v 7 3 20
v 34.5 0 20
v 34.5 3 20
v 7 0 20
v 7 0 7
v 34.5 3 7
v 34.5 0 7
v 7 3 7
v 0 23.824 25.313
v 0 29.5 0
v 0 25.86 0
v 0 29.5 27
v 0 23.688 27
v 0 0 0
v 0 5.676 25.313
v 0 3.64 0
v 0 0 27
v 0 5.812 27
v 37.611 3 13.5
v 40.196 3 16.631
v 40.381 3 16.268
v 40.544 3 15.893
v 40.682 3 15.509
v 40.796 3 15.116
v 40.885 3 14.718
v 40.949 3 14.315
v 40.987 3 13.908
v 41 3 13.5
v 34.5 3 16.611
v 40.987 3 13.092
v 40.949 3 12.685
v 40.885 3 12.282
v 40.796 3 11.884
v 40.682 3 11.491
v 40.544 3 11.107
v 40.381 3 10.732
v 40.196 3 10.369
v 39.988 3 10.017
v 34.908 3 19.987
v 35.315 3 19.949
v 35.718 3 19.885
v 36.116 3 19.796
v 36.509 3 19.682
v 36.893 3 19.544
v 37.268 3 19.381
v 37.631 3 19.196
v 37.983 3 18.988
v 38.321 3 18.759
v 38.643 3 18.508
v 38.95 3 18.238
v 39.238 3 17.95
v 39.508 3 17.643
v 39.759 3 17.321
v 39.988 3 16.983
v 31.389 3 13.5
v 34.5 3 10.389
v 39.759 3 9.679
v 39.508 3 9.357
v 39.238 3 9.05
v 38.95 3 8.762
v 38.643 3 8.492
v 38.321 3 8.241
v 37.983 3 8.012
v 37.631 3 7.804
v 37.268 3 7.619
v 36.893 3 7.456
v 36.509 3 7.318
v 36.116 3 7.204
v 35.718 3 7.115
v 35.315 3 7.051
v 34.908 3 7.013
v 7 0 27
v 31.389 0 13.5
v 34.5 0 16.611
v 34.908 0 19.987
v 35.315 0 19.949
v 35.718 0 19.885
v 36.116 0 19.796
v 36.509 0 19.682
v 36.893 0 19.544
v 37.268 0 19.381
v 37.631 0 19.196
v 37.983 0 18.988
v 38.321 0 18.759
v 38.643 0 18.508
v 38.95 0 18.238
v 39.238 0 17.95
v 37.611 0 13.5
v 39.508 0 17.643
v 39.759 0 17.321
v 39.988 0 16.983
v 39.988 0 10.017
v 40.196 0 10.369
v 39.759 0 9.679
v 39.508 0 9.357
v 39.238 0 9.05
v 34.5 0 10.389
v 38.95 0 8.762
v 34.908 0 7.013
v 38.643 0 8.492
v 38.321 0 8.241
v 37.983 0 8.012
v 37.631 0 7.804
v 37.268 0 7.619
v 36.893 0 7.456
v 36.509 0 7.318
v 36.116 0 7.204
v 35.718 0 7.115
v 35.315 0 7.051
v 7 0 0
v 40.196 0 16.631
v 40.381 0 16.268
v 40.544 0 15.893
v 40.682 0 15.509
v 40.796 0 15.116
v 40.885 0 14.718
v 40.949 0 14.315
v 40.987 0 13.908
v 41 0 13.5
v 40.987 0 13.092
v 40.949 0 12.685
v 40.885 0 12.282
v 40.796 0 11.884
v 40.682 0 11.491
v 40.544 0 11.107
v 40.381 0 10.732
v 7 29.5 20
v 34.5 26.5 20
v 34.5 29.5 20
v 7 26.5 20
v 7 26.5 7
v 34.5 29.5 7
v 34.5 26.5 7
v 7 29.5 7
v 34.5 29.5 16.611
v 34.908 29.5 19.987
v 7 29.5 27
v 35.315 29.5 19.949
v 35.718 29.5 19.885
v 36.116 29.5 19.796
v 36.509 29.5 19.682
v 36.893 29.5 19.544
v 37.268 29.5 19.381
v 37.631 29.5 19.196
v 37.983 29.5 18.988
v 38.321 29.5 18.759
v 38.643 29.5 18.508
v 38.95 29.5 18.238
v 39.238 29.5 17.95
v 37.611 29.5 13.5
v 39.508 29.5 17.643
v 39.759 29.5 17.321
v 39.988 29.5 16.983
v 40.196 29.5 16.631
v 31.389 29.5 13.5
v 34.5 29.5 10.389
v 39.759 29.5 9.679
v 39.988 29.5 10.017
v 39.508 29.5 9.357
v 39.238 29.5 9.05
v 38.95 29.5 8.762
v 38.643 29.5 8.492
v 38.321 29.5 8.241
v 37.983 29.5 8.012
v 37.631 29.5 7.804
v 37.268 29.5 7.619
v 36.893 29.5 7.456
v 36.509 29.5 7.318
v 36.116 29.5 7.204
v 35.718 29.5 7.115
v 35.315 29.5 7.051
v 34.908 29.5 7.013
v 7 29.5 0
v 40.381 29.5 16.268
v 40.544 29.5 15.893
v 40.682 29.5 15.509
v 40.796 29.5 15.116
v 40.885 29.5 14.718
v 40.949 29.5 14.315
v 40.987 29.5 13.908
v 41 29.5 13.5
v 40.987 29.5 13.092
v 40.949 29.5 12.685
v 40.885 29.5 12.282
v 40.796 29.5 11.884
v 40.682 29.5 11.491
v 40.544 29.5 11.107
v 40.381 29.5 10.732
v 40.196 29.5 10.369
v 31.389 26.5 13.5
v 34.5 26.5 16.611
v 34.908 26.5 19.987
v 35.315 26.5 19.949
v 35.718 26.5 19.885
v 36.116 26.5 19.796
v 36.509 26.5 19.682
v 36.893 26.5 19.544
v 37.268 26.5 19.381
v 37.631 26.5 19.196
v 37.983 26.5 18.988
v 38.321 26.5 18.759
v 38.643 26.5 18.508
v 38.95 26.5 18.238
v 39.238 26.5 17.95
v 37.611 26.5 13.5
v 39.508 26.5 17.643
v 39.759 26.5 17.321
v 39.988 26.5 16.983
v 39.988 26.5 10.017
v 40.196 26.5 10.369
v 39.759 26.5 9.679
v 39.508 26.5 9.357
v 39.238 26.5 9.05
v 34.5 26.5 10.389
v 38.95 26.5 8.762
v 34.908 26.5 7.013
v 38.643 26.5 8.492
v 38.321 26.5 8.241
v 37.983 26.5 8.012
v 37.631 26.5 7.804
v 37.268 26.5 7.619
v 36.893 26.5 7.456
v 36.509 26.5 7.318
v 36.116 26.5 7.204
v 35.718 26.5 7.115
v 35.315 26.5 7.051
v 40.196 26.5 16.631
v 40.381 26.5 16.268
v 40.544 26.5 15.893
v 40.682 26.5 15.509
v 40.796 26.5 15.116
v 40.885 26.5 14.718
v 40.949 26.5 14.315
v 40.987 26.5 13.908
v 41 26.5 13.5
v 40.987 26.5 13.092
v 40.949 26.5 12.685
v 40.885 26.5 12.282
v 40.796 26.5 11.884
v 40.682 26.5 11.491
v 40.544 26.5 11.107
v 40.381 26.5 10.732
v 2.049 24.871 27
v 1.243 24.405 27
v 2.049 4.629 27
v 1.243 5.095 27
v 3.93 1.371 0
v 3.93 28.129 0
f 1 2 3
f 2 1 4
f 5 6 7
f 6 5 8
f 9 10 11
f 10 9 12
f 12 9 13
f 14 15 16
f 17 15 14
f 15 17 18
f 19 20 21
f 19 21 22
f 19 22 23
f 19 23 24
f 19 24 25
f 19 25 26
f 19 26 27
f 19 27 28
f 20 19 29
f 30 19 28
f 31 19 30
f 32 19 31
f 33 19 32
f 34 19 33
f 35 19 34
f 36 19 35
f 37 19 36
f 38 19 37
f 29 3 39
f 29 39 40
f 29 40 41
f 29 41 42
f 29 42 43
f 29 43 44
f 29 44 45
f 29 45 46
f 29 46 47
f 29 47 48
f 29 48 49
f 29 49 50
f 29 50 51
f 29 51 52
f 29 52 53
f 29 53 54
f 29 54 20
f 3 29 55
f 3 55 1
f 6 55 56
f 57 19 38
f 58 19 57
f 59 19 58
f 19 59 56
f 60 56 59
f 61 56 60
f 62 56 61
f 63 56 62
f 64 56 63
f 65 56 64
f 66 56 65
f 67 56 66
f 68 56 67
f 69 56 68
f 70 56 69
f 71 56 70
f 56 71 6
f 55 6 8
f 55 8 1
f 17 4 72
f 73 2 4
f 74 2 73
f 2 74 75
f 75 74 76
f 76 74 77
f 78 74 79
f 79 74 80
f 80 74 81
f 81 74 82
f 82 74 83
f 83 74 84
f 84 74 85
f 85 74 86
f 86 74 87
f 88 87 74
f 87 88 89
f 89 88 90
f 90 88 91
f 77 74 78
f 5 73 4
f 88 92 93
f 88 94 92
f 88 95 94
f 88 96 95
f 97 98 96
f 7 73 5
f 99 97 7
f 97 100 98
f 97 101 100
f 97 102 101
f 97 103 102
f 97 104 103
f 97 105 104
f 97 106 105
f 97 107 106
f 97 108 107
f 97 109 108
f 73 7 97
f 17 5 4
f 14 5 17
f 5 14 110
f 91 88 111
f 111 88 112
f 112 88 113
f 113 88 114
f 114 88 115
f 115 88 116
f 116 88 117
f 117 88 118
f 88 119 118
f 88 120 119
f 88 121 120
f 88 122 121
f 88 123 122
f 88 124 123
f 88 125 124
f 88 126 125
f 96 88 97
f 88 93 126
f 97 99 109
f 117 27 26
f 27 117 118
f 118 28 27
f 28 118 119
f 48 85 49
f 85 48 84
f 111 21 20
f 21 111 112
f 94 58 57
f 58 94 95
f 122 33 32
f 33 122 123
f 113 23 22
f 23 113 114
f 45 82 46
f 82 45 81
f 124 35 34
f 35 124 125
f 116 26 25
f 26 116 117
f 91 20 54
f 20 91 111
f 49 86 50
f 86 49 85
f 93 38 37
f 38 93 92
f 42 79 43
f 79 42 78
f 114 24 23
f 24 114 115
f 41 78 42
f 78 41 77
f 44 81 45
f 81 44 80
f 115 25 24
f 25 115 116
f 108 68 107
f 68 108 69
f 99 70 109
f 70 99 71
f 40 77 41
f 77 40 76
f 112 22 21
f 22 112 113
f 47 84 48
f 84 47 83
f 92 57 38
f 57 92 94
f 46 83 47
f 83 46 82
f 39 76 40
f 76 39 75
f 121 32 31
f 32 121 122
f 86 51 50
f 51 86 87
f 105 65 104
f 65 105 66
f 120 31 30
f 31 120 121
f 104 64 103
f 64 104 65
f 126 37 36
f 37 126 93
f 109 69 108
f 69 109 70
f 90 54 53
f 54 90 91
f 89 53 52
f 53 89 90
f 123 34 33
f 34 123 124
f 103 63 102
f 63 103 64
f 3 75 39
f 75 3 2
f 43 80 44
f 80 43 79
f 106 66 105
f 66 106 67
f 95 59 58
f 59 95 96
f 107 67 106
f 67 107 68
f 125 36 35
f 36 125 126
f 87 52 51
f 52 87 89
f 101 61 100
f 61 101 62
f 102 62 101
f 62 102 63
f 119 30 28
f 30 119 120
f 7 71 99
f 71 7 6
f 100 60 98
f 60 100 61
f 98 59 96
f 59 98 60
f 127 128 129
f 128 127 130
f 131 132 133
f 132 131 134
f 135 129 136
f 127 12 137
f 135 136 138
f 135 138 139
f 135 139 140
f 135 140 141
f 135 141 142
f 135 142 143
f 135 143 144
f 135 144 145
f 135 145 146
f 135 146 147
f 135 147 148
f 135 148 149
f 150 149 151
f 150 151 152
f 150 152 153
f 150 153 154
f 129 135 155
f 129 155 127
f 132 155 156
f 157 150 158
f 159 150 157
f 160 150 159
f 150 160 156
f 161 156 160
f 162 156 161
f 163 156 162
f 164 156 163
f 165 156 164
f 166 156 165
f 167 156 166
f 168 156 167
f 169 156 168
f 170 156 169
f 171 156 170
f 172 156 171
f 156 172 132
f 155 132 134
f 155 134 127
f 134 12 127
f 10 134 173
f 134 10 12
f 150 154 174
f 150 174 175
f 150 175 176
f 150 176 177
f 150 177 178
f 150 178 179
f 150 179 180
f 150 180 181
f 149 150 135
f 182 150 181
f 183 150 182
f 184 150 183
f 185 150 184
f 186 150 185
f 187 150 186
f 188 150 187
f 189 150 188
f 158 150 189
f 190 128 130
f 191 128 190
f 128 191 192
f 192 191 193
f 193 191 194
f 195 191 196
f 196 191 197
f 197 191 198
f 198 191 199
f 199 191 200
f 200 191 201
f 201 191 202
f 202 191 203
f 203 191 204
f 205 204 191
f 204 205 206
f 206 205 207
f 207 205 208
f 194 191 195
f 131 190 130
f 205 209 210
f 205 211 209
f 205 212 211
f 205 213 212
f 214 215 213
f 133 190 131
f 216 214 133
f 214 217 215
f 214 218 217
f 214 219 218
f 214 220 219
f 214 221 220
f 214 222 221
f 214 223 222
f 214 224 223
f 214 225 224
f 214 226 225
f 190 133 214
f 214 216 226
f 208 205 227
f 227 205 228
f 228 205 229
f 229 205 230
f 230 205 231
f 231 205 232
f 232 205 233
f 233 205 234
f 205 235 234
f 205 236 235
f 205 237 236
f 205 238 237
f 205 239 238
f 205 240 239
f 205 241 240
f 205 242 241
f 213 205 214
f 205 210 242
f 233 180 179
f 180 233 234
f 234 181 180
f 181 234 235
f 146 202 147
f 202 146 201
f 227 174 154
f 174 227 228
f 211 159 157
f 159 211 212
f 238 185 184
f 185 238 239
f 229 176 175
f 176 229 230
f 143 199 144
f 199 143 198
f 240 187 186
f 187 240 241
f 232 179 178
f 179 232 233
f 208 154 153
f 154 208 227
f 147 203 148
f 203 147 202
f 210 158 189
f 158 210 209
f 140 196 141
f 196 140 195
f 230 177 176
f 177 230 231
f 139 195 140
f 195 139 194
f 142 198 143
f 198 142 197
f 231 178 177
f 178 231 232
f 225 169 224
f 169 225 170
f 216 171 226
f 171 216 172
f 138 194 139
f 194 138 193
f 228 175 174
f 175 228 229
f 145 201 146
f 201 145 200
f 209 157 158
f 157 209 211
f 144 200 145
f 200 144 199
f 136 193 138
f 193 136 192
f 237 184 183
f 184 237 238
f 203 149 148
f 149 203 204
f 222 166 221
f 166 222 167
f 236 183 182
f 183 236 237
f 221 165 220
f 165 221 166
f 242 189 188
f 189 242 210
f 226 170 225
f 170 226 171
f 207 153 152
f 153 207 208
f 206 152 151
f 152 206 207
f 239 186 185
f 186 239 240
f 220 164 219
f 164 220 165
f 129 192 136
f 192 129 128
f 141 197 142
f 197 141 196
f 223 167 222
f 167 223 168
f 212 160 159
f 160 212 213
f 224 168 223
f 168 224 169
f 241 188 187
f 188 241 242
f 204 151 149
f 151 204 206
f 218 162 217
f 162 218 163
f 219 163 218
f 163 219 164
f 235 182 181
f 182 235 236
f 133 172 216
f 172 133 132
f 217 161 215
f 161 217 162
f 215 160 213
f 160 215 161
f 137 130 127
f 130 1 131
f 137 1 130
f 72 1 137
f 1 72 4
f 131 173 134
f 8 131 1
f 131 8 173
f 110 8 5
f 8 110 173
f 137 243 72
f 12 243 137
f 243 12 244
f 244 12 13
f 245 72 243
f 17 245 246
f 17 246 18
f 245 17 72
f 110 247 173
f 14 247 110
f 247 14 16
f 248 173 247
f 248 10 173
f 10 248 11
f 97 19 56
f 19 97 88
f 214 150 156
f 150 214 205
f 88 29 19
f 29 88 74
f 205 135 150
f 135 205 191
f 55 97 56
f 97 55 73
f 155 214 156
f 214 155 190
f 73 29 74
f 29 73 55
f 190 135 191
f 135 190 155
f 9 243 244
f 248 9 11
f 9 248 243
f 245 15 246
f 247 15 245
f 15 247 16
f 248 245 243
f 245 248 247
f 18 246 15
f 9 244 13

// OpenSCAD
inner_width         = 23.5;
inner_length        = 34;
backplate_thickness = 7;
backplate_height    = 27;

side_height         = 13;
side_thickness      = 3;
side_radius         = side_height / 2;
hole_size           = 4.4;

width               = inner_width  + 2 * side_thickness;
length              = inner_length + backplate_thickness;
extra               = 1;

cutout_top          = 20;
cutout_bottom       = 27;
cutout_thickness    = 4;

triangle_outer      = 0.57735;
triangle_inner      = 0.28868;

module dashcam_mount_side () {
    cube([ length - side_radius, side_thickness, side_height ]);

    translate([ length - side_radius, side_thickness, side_radius ])
        rotate([ 90, 0, 0 ])
            cylinder(r = side_radius, h = side_thickness, $fn = 100);
}

module dashcam_mount_positive () {
    // backplate
    cube([backplate_thickness, width, backplate_height]);

    // sides
    side_z = (backplate_height - side_height) / 2;
    translate([ 0, 0, side_z ])
        dashcam_mount_side();
    translate([ 0, width - side_thickness, side_z ])
        dashcam_mount_side();
}

module dashcam_mount_negative () {
    // holes
    hole_diagonal = sqrt(2 * (hole_size * hole_size));
    hole_x = length - side_radius - hole_diagonal/2;
    echo(hole_x);
    translate([ hole_x, -extra, backplate_height/2 ])
        rotate([ 0, 45, 0 ])
            cube([ hole_size, width + 2*extra, hole_size ]);

    // backplate cutout
    cutout_radius_top    = cutout_top    * triangle_outer;
    cutout_radius_bottom = cutout_bottom * triangle_outer;
    cutout_x =            -cutout_bottom * triangle_inner + cutout_thickness;
    translate([ cutout_x, width/2, -extra ])
        rotate([ 0, 0, 60 ])
            cylinder(
                h = backplate_height + 2*extra,
                r1 = cutout_radius_bottom,
                r2 = cutout_radius_top,
                $fn = 3,
                center = false
            );
}

module dashcam_mount () {
    difference () {
        dashcam_mount_positive();
        dashcam_mount_negative();
    }
}

dashcam_mount();
